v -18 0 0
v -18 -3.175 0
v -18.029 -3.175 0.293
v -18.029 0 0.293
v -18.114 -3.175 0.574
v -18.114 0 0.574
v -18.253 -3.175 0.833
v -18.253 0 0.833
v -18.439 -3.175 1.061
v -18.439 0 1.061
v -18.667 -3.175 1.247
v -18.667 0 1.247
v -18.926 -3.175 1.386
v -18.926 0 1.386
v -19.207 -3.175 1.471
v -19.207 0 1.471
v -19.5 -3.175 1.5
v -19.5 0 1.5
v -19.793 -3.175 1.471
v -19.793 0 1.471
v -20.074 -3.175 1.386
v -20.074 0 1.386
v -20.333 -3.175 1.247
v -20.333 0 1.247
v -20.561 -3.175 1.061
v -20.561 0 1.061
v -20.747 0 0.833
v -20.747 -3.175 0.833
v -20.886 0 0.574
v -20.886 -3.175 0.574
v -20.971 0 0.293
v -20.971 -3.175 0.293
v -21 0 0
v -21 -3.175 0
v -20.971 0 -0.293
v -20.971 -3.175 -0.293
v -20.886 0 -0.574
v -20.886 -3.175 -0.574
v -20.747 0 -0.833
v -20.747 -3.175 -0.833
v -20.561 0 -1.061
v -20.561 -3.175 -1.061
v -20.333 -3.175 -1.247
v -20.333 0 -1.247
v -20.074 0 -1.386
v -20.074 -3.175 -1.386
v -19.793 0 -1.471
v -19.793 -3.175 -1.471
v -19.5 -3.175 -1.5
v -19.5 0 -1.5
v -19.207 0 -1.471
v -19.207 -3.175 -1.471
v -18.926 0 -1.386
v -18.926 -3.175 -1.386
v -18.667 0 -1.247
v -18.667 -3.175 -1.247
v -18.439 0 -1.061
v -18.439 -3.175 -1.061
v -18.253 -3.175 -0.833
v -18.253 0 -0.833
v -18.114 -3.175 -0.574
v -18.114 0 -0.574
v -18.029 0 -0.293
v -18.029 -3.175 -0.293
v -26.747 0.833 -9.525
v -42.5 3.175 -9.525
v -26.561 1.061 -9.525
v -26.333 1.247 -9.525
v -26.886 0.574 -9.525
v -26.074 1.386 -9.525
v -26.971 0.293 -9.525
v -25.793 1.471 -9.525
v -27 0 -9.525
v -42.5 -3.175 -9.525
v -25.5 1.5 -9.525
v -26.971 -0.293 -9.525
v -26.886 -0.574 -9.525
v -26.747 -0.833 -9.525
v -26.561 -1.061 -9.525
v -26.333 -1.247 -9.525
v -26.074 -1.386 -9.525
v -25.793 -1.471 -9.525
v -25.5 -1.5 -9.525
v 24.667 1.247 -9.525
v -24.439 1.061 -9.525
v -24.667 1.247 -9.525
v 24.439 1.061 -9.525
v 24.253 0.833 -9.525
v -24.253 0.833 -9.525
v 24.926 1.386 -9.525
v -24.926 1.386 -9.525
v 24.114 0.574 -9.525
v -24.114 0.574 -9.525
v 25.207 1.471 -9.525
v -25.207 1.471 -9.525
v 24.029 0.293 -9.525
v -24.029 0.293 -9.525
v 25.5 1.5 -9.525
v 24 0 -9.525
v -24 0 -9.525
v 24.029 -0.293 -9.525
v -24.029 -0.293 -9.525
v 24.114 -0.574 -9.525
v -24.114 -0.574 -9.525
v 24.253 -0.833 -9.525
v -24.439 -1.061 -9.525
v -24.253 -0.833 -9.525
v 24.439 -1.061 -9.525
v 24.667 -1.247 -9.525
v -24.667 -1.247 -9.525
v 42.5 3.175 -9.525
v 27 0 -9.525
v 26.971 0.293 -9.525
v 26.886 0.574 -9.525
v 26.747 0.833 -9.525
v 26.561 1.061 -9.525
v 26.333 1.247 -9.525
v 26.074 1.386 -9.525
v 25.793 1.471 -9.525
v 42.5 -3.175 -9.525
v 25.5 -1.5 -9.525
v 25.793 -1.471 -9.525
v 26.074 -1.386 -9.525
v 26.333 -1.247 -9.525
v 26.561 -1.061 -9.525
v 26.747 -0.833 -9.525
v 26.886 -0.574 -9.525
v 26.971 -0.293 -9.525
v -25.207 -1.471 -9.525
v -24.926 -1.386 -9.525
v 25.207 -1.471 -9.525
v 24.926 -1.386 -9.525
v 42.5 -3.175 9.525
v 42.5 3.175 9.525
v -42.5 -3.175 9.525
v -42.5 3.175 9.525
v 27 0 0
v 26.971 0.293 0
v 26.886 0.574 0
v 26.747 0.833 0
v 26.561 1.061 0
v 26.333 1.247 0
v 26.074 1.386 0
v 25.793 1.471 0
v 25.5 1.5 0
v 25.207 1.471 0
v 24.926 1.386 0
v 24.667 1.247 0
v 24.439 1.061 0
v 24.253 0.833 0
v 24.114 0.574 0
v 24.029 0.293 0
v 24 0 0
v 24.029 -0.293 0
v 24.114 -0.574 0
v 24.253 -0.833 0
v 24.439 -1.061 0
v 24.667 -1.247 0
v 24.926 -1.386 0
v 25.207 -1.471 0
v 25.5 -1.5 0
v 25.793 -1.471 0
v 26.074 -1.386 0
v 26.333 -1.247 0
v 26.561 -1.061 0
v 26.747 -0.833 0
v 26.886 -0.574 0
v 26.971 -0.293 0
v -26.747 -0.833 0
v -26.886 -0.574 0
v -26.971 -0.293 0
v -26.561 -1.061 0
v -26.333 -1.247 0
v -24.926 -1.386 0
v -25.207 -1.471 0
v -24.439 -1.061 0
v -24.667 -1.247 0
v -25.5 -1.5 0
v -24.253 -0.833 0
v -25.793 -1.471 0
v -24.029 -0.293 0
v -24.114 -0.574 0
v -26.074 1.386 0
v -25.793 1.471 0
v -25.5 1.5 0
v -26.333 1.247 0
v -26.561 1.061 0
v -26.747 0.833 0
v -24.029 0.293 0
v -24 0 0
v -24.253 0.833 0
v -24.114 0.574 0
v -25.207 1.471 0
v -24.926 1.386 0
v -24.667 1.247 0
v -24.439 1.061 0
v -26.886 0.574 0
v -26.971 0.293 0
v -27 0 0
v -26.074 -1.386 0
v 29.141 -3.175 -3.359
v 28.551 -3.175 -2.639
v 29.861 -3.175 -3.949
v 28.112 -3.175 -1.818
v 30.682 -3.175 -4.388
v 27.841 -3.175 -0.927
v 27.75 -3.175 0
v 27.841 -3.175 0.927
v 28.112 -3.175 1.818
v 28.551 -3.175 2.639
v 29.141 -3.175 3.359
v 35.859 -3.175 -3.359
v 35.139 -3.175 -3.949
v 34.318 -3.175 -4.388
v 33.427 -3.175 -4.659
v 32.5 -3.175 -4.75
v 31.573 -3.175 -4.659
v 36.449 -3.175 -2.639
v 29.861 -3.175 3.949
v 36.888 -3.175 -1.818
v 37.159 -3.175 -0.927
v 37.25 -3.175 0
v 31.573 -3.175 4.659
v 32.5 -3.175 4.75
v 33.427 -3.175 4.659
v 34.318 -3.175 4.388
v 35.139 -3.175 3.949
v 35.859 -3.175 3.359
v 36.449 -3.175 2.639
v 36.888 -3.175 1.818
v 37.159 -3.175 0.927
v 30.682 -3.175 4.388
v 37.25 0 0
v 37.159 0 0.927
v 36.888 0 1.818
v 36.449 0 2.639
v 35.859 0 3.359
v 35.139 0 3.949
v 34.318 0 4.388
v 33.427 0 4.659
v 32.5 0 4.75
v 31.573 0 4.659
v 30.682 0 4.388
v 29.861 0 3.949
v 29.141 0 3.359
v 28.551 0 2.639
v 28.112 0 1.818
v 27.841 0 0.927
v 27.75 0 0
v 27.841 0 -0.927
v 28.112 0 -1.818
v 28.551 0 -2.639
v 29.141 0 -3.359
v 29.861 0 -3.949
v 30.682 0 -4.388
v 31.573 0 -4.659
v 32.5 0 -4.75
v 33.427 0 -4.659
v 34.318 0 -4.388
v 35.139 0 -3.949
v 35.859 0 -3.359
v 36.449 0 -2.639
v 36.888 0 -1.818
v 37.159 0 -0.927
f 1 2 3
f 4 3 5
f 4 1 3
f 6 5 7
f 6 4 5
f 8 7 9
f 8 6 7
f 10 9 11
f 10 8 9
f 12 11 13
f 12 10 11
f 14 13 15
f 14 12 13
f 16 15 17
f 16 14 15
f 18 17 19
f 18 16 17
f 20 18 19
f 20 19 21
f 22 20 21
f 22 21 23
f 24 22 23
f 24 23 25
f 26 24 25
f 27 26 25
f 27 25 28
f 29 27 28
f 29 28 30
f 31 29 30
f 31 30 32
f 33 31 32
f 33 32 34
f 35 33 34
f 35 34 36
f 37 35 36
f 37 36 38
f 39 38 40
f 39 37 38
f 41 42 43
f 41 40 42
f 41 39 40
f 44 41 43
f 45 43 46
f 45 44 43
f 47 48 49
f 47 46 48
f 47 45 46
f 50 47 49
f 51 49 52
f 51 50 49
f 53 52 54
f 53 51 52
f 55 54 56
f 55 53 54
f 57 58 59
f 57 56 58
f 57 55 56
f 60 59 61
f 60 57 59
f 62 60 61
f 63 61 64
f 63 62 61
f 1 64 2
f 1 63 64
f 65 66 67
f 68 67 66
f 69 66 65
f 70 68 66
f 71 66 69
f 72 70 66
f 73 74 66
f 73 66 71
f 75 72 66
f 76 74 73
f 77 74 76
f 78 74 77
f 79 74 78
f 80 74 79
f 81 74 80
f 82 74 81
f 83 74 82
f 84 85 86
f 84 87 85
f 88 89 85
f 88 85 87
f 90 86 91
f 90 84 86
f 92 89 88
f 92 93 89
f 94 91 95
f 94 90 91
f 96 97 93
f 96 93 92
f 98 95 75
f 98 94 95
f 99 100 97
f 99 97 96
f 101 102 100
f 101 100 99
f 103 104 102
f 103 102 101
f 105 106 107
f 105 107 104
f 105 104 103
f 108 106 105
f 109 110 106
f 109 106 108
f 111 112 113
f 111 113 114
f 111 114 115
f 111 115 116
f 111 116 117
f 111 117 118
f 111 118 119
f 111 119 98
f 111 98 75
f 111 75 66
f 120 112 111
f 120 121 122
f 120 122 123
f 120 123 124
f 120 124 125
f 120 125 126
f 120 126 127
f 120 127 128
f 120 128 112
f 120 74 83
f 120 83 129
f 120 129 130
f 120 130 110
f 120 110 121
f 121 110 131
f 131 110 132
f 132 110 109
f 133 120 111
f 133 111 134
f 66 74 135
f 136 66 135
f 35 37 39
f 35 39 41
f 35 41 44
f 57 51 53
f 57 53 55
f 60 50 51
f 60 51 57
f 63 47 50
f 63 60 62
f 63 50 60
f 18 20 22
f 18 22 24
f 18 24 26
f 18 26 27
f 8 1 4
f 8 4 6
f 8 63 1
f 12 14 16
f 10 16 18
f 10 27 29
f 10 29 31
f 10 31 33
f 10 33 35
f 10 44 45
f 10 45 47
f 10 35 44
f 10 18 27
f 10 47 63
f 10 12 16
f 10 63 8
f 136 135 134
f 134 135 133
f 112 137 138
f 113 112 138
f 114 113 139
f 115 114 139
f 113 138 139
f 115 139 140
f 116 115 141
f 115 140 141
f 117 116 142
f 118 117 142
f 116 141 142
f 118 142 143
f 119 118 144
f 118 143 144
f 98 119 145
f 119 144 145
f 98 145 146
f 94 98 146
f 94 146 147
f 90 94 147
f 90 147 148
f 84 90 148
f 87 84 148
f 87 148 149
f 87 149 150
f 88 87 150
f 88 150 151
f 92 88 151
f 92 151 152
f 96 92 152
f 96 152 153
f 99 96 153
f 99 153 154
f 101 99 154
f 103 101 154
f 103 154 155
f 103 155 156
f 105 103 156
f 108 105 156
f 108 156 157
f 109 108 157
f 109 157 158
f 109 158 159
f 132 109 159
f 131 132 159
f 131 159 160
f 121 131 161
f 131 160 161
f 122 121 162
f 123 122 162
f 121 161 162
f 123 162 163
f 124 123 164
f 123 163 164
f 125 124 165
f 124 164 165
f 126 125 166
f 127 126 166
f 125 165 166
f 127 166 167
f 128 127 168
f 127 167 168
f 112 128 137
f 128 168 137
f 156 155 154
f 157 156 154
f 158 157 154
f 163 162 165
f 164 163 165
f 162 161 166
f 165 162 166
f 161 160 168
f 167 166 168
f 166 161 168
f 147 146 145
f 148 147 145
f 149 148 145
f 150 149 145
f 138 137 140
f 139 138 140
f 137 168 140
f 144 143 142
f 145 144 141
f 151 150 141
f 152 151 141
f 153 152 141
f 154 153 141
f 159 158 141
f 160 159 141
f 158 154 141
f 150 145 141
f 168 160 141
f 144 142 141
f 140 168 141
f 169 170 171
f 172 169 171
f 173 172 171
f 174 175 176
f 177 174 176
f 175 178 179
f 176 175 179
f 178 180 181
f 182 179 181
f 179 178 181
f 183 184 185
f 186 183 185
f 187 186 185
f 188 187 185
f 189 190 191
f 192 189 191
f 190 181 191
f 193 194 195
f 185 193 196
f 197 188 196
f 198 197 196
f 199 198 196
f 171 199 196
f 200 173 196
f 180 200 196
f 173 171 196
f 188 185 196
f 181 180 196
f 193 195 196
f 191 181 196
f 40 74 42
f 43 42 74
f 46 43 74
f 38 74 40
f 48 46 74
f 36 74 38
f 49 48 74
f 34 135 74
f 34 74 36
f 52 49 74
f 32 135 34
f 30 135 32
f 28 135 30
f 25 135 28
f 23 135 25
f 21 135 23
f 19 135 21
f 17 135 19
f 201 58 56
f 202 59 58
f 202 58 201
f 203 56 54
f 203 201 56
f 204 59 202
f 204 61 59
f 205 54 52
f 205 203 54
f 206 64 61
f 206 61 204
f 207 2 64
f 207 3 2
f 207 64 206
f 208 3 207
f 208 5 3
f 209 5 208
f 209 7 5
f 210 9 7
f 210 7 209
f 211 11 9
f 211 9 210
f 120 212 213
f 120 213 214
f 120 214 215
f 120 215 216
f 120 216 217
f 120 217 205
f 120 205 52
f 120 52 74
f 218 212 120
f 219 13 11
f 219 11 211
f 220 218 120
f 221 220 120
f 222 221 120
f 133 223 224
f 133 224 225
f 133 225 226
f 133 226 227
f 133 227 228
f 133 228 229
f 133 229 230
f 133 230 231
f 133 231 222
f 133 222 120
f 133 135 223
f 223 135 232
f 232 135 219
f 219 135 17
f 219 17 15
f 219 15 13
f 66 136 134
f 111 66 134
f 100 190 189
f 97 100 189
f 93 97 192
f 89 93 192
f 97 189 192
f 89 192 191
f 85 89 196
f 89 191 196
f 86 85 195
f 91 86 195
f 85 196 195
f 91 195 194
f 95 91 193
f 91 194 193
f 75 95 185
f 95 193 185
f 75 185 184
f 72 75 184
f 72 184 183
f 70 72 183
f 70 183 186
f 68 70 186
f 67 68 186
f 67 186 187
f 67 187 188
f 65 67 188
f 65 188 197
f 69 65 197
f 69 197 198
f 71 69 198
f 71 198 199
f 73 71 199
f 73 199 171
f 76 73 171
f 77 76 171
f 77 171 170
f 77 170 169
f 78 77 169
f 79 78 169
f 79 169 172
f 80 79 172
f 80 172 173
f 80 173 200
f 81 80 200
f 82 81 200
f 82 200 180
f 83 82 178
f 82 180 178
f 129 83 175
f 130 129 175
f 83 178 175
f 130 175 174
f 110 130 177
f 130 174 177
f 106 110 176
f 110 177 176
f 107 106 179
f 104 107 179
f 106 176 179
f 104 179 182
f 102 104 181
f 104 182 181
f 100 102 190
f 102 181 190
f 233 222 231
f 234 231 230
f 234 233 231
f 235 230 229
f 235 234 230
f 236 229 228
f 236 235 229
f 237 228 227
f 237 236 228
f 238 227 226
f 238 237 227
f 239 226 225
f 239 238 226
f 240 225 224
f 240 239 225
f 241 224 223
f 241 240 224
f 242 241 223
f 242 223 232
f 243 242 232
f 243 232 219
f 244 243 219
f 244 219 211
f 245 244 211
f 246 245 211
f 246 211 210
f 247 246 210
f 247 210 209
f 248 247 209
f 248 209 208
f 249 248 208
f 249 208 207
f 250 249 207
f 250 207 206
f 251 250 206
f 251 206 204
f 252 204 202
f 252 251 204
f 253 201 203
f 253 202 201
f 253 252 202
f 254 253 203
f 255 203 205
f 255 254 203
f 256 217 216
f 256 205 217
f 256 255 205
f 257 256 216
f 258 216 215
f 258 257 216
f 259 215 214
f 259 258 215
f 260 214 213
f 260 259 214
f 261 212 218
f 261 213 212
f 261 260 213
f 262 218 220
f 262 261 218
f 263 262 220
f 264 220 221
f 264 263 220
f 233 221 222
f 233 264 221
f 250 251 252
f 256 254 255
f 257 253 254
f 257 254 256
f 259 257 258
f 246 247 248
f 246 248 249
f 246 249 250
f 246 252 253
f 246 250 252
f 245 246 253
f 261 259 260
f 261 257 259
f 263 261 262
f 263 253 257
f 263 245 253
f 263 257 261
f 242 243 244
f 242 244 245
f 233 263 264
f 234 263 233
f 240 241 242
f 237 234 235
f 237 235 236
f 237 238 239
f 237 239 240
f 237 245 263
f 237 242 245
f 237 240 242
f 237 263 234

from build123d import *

# Parameters (mm, degrees)
F0_W     = 85
F0_H     = 19.05
F1_DEPTH = 3.175
F3_R     = 4.75
F3_R_2   = 1.5
F4_DEPTH = 21.8
F2_R     = 1.5
F5_DEPTH = 15


with BuildPart() as f1:
    # F0 (on Front) → F1 (new body, symmetric)
    with BuildSketch(Plane.XZ):
        Rectangle(F0_W, F0_H)
    extrude(amount=F1_DEPTH, both=True)

    # F3 (on Front) → F4 (cut)
    with BuildSketch(Plane.XZ):
        with Locations((32.5, 0)):
            Circle(F3_R)
        with Locations((-19.5, 0)):
            Circle(F3_R_2)
    extrude(amount=F4_DEPTH, mode=Mode.SUBTRACT)

    # F2 (on Top) → F5 (cut)
    with BuildSketch(Plane.XY):
        with Locations((-25.5, 0)):
            Circle(F2_R)
        with Locations((25.5, 0)):
            Circle(F2_R)
    extrude(amount=-F5_DEPTH, mode=Mode.SUBTRACT)


solid = f1.part
